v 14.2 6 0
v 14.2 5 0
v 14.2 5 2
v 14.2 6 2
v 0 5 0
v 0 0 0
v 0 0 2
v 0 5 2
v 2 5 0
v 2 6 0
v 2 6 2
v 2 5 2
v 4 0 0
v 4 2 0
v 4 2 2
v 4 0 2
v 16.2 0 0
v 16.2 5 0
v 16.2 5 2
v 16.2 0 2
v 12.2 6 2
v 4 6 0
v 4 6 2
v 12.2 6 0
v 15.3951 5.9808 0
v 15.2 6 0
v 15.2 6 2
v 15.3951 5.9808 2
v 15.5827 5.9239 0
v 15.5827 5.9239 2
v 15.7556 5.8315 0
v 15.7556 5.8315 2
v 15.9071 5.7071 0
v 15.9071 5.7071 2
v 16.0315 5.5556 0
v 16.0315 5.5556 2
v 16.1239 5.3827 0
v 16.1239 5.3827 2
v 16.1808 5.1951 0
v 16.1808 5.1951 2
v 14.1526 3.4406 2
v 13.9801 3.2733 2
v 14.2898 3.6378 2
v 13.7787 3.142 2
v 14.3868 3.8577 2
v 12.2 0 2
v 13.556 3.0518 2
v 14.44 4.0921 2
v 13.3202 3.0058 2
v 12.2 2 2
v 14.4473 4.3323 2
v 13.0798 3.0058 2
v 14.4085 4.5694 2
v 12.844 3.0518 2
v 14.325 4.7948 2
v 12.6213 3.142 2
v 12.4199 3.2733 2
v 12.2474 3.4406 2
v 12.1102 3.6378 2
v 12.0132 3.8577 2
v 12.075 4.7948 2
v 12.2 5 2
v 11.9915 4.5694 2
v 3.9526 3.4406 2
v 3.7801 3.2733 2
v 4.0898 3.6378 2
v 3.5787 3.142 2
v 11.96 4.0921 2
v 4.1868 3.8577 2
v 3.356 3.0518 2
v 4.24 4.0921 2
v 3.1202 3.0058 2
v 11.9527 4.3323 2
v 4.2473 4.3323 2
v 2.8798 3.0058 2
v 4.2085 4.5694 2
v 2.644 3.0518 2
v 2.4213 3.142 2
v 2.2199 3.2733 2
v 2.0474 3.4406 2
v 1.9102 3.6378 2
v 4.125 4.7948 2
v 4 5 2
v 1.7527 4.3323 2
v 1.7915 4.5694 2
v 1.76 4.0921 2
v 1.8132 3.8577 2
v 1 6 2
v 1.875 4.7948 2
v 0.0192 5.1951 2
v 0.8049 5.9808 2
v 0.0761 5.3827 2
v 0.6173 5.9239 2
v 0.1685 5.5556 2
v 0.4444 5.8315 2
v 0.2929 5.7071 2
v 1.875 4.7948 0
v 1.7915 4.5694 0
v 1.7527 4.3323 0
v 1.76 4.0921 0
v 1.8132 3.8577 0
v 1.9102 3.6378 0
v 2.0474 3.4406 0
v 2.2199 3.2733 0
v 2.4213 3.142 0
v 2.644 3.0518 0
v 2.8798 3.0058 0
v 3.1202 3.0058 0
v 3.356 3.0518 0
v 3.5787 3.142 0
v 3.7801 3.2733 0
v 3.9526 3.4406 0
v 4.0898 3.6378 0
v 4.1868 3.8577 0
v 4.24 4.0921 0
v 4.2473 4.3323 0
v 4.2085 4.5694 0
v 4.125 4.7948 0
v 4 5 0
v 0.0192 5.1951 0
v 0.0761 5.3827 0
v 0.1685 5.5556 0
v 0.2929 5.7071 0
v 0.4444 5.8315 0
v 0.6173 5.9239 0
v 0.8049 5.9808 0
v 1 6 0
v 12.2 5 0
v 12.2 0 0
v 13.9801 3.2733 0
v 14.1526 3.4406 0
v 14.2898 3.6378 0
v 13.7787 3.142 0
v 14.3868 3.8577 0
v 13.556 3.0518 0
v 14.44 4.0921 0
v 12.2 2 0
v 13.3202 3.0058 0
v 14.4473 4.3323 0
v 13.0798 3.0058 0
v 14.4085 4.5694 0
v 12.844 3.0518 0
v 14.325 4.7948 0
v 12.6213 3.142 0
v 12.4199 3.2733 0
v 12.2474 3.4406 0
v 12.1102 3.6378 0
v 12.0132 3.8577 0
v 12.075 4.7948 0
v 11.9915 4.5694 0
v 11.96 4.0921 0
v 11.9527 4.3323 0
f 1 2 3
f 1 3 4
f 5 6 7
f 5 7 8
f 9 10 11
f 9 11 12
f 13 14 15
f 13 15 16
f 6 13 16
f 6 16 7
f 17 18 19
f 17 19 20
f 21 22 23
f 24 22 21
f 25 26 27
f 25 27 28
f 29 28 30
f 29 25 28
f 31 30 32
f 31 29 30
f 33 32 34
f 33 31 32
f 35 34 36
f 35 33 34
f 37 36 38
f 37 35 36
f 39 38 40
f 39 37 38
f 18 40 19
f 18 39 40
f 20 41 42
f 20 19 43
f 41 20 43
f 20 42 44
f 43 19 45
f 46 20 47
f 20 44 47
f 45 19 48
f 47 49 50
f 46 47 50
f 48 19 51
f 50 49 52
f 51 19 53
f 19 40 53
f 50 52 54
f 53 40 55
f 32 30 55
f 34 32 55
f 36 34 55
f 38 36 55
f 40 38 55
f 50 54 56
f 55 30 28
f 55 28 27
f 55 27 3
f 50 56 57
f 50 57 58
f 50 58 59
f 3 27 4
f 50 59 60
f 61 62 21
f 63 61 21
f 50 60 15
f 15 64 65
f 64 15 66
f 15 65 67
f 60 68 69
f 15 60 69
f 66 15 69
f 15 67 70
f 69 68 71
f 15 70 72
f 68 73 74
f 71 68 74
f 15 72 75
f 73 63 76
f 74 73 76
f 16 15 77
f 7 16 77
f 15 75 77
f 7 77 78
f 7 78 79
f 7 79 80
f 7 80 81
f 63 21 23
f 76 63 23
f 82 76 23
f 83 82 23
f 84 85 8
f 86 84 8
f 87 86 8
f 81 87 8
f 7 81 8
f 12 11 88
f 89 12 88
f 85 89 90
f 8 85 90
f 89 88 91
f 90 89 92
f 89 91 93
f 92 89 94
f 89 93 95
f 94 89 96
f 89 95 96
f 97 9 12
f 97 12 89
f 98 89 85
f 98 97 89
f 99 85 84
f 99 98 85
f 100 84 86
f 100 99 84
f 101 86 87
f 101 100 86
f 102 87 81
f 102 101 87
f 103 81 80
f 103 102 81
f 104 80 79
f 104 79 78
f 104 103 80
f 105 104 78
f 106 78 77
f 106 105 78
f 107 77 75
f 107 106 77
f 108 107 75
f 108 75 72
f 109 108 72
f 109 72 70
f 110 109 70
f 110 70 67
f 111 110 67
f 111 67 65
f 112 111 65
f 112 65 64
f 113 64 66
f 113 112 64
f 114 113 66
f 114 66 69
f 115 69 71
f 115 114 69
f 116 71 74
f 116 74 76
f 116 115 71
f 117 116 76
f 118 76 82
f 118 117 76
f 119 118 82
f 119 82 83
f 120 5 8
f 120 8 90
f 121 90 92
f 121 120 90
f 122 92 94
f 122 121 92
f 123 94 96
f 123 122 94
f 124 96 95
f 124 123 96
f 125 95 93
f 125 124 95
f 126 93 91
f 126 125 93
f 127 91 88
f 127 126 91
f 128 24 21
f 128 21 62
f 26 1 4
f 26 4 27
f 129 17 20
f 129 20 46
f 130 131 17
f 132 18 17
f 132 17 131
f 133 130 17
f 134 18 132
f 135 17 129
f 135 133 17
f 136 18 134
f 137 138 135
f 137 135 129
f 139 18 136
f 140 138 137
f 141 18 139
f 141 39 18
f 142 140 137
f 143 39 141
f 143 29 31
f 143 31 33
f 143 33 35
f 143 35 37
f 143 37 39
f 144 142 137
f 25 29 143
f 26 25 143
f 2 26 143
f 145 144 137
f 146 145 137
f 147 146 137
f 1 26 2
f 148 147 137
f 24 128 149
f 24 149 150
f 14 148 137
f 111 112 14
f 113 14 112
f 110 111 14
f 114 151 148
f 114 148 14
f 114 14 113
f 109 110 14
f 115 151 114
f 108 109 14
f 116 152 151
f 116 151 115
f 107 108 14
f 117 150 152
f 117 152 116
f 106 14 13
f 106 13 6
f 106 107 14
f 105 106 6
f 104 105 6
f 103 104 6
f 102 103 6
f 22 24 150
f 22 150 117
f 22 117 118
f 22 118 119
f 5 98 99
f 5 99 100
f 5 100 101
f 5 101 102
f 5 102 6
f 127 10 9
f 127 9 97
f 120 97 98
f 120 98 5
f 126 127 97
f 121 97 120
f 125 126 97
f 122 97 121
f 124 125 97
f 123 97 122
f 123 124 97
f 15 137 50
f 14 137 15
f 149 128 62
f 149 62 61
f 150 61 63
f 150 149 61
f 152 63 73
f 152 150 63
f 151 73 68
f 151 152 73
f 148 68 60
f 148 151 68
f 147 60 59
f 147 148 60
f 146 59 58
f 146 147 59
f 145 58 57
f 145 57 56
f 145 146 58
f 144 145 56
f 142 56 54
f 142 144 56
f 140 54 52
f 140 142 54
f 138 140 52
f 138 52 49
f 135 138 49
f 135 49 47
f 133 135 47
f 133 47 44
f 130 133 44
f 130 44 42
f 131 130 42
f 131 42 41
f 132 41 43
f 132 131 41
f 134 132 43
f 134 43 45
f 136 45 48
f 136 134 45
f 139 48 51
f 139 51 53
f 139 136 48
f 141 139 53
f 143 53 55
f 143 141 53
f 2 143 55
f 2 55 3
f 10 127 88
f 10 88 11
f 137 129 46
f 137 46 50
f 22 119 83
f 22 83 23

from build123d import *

# Parameters (mm, degrees)
BOSS_EXTRUDE1_DEPTH = 2


with BuildPart() as part:
    # Sketch1 → Boss-Extrude1 (new body)
    with BuildSketch(Plane.XY):
        with BuildLine():
            Line((4, 6), (12.2, 6))
            Line((12.2, 6), (12.2, 5))
            ThreePointArc((12.2, 5), (13.2, 3), (14.2, 5))
            Line((14.2, 5), (14.2, 6))
            Line((14.2, 6), (15.2, 6))
            ThreePointArc((15.2, 6), (15.907106781, 5.707106781), (16.2, 5))
            Line((16.2, 5), (16.2, 0))
            Line((16.2, 0), (12.2, 0))
            Line((12.2, 0), (12.2, 2))
            Line((12.2, 2), (4, 2))
            Line((4, 2), (4, 0))
            Line((4, 0), (0, 0))
            Line((0, 0), (0, 5))
            ThreePointArc((0, 5), (0.292893219, 5.707106781), (1, 6))
            Line((1, 6), (2, 6))
            Line((2, 6), (2, 5))
            ThreePointArc((2, 5), (3, 3), (4, 5))
            Line((4, 5), (4, 6))
        make_face()
    extrude(amount=BOSS_EXTRUDE1_DEPTH)


solid = part.part
